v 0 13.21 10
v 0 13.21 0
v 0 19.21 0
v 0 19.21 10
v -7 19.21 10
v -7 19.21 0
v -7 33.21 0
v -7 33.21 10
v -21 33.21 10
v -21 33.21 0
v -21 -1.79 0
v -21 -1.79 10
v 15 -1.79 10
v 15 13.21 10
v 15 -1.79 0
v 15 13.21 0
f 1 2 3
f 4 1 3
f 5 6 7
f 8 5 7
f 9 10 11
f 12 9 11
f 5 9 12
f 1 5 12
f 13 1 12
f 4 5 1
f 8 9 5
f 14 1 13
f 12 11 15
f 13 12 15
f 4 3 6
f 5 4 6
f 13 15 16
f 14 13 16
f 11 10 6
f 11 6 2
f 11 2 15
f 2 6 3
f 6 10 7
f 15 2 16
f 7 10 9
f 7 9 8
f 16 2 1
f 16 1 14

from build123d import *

# Parameters (mm, degrees)
F0_W     = 14
F0_H     = 14
F0_W_2   = 15
F0_H_2   = 15
F1_DEPTH = 10


with BuildPart() as f1:
    # F0 (on Top) → F1 (new body)
    with BuildSketch(Plane.XY):
        Polygon((-21, -1.789773), (0, -1.789773), (0, 13.210227), (0, 19.210227), (-7, 19.210227), (-21, 19.210227), align=None)
        with Locations((-14, 26.210227)):
            Rectangle(F0_W, F0_H)
        with Locations((7.5, 5.710227)):
            Rectangle(F0_W_2, F0_H_2)
    extrude(amount=F1_DEPTH)


solid = f1.part
